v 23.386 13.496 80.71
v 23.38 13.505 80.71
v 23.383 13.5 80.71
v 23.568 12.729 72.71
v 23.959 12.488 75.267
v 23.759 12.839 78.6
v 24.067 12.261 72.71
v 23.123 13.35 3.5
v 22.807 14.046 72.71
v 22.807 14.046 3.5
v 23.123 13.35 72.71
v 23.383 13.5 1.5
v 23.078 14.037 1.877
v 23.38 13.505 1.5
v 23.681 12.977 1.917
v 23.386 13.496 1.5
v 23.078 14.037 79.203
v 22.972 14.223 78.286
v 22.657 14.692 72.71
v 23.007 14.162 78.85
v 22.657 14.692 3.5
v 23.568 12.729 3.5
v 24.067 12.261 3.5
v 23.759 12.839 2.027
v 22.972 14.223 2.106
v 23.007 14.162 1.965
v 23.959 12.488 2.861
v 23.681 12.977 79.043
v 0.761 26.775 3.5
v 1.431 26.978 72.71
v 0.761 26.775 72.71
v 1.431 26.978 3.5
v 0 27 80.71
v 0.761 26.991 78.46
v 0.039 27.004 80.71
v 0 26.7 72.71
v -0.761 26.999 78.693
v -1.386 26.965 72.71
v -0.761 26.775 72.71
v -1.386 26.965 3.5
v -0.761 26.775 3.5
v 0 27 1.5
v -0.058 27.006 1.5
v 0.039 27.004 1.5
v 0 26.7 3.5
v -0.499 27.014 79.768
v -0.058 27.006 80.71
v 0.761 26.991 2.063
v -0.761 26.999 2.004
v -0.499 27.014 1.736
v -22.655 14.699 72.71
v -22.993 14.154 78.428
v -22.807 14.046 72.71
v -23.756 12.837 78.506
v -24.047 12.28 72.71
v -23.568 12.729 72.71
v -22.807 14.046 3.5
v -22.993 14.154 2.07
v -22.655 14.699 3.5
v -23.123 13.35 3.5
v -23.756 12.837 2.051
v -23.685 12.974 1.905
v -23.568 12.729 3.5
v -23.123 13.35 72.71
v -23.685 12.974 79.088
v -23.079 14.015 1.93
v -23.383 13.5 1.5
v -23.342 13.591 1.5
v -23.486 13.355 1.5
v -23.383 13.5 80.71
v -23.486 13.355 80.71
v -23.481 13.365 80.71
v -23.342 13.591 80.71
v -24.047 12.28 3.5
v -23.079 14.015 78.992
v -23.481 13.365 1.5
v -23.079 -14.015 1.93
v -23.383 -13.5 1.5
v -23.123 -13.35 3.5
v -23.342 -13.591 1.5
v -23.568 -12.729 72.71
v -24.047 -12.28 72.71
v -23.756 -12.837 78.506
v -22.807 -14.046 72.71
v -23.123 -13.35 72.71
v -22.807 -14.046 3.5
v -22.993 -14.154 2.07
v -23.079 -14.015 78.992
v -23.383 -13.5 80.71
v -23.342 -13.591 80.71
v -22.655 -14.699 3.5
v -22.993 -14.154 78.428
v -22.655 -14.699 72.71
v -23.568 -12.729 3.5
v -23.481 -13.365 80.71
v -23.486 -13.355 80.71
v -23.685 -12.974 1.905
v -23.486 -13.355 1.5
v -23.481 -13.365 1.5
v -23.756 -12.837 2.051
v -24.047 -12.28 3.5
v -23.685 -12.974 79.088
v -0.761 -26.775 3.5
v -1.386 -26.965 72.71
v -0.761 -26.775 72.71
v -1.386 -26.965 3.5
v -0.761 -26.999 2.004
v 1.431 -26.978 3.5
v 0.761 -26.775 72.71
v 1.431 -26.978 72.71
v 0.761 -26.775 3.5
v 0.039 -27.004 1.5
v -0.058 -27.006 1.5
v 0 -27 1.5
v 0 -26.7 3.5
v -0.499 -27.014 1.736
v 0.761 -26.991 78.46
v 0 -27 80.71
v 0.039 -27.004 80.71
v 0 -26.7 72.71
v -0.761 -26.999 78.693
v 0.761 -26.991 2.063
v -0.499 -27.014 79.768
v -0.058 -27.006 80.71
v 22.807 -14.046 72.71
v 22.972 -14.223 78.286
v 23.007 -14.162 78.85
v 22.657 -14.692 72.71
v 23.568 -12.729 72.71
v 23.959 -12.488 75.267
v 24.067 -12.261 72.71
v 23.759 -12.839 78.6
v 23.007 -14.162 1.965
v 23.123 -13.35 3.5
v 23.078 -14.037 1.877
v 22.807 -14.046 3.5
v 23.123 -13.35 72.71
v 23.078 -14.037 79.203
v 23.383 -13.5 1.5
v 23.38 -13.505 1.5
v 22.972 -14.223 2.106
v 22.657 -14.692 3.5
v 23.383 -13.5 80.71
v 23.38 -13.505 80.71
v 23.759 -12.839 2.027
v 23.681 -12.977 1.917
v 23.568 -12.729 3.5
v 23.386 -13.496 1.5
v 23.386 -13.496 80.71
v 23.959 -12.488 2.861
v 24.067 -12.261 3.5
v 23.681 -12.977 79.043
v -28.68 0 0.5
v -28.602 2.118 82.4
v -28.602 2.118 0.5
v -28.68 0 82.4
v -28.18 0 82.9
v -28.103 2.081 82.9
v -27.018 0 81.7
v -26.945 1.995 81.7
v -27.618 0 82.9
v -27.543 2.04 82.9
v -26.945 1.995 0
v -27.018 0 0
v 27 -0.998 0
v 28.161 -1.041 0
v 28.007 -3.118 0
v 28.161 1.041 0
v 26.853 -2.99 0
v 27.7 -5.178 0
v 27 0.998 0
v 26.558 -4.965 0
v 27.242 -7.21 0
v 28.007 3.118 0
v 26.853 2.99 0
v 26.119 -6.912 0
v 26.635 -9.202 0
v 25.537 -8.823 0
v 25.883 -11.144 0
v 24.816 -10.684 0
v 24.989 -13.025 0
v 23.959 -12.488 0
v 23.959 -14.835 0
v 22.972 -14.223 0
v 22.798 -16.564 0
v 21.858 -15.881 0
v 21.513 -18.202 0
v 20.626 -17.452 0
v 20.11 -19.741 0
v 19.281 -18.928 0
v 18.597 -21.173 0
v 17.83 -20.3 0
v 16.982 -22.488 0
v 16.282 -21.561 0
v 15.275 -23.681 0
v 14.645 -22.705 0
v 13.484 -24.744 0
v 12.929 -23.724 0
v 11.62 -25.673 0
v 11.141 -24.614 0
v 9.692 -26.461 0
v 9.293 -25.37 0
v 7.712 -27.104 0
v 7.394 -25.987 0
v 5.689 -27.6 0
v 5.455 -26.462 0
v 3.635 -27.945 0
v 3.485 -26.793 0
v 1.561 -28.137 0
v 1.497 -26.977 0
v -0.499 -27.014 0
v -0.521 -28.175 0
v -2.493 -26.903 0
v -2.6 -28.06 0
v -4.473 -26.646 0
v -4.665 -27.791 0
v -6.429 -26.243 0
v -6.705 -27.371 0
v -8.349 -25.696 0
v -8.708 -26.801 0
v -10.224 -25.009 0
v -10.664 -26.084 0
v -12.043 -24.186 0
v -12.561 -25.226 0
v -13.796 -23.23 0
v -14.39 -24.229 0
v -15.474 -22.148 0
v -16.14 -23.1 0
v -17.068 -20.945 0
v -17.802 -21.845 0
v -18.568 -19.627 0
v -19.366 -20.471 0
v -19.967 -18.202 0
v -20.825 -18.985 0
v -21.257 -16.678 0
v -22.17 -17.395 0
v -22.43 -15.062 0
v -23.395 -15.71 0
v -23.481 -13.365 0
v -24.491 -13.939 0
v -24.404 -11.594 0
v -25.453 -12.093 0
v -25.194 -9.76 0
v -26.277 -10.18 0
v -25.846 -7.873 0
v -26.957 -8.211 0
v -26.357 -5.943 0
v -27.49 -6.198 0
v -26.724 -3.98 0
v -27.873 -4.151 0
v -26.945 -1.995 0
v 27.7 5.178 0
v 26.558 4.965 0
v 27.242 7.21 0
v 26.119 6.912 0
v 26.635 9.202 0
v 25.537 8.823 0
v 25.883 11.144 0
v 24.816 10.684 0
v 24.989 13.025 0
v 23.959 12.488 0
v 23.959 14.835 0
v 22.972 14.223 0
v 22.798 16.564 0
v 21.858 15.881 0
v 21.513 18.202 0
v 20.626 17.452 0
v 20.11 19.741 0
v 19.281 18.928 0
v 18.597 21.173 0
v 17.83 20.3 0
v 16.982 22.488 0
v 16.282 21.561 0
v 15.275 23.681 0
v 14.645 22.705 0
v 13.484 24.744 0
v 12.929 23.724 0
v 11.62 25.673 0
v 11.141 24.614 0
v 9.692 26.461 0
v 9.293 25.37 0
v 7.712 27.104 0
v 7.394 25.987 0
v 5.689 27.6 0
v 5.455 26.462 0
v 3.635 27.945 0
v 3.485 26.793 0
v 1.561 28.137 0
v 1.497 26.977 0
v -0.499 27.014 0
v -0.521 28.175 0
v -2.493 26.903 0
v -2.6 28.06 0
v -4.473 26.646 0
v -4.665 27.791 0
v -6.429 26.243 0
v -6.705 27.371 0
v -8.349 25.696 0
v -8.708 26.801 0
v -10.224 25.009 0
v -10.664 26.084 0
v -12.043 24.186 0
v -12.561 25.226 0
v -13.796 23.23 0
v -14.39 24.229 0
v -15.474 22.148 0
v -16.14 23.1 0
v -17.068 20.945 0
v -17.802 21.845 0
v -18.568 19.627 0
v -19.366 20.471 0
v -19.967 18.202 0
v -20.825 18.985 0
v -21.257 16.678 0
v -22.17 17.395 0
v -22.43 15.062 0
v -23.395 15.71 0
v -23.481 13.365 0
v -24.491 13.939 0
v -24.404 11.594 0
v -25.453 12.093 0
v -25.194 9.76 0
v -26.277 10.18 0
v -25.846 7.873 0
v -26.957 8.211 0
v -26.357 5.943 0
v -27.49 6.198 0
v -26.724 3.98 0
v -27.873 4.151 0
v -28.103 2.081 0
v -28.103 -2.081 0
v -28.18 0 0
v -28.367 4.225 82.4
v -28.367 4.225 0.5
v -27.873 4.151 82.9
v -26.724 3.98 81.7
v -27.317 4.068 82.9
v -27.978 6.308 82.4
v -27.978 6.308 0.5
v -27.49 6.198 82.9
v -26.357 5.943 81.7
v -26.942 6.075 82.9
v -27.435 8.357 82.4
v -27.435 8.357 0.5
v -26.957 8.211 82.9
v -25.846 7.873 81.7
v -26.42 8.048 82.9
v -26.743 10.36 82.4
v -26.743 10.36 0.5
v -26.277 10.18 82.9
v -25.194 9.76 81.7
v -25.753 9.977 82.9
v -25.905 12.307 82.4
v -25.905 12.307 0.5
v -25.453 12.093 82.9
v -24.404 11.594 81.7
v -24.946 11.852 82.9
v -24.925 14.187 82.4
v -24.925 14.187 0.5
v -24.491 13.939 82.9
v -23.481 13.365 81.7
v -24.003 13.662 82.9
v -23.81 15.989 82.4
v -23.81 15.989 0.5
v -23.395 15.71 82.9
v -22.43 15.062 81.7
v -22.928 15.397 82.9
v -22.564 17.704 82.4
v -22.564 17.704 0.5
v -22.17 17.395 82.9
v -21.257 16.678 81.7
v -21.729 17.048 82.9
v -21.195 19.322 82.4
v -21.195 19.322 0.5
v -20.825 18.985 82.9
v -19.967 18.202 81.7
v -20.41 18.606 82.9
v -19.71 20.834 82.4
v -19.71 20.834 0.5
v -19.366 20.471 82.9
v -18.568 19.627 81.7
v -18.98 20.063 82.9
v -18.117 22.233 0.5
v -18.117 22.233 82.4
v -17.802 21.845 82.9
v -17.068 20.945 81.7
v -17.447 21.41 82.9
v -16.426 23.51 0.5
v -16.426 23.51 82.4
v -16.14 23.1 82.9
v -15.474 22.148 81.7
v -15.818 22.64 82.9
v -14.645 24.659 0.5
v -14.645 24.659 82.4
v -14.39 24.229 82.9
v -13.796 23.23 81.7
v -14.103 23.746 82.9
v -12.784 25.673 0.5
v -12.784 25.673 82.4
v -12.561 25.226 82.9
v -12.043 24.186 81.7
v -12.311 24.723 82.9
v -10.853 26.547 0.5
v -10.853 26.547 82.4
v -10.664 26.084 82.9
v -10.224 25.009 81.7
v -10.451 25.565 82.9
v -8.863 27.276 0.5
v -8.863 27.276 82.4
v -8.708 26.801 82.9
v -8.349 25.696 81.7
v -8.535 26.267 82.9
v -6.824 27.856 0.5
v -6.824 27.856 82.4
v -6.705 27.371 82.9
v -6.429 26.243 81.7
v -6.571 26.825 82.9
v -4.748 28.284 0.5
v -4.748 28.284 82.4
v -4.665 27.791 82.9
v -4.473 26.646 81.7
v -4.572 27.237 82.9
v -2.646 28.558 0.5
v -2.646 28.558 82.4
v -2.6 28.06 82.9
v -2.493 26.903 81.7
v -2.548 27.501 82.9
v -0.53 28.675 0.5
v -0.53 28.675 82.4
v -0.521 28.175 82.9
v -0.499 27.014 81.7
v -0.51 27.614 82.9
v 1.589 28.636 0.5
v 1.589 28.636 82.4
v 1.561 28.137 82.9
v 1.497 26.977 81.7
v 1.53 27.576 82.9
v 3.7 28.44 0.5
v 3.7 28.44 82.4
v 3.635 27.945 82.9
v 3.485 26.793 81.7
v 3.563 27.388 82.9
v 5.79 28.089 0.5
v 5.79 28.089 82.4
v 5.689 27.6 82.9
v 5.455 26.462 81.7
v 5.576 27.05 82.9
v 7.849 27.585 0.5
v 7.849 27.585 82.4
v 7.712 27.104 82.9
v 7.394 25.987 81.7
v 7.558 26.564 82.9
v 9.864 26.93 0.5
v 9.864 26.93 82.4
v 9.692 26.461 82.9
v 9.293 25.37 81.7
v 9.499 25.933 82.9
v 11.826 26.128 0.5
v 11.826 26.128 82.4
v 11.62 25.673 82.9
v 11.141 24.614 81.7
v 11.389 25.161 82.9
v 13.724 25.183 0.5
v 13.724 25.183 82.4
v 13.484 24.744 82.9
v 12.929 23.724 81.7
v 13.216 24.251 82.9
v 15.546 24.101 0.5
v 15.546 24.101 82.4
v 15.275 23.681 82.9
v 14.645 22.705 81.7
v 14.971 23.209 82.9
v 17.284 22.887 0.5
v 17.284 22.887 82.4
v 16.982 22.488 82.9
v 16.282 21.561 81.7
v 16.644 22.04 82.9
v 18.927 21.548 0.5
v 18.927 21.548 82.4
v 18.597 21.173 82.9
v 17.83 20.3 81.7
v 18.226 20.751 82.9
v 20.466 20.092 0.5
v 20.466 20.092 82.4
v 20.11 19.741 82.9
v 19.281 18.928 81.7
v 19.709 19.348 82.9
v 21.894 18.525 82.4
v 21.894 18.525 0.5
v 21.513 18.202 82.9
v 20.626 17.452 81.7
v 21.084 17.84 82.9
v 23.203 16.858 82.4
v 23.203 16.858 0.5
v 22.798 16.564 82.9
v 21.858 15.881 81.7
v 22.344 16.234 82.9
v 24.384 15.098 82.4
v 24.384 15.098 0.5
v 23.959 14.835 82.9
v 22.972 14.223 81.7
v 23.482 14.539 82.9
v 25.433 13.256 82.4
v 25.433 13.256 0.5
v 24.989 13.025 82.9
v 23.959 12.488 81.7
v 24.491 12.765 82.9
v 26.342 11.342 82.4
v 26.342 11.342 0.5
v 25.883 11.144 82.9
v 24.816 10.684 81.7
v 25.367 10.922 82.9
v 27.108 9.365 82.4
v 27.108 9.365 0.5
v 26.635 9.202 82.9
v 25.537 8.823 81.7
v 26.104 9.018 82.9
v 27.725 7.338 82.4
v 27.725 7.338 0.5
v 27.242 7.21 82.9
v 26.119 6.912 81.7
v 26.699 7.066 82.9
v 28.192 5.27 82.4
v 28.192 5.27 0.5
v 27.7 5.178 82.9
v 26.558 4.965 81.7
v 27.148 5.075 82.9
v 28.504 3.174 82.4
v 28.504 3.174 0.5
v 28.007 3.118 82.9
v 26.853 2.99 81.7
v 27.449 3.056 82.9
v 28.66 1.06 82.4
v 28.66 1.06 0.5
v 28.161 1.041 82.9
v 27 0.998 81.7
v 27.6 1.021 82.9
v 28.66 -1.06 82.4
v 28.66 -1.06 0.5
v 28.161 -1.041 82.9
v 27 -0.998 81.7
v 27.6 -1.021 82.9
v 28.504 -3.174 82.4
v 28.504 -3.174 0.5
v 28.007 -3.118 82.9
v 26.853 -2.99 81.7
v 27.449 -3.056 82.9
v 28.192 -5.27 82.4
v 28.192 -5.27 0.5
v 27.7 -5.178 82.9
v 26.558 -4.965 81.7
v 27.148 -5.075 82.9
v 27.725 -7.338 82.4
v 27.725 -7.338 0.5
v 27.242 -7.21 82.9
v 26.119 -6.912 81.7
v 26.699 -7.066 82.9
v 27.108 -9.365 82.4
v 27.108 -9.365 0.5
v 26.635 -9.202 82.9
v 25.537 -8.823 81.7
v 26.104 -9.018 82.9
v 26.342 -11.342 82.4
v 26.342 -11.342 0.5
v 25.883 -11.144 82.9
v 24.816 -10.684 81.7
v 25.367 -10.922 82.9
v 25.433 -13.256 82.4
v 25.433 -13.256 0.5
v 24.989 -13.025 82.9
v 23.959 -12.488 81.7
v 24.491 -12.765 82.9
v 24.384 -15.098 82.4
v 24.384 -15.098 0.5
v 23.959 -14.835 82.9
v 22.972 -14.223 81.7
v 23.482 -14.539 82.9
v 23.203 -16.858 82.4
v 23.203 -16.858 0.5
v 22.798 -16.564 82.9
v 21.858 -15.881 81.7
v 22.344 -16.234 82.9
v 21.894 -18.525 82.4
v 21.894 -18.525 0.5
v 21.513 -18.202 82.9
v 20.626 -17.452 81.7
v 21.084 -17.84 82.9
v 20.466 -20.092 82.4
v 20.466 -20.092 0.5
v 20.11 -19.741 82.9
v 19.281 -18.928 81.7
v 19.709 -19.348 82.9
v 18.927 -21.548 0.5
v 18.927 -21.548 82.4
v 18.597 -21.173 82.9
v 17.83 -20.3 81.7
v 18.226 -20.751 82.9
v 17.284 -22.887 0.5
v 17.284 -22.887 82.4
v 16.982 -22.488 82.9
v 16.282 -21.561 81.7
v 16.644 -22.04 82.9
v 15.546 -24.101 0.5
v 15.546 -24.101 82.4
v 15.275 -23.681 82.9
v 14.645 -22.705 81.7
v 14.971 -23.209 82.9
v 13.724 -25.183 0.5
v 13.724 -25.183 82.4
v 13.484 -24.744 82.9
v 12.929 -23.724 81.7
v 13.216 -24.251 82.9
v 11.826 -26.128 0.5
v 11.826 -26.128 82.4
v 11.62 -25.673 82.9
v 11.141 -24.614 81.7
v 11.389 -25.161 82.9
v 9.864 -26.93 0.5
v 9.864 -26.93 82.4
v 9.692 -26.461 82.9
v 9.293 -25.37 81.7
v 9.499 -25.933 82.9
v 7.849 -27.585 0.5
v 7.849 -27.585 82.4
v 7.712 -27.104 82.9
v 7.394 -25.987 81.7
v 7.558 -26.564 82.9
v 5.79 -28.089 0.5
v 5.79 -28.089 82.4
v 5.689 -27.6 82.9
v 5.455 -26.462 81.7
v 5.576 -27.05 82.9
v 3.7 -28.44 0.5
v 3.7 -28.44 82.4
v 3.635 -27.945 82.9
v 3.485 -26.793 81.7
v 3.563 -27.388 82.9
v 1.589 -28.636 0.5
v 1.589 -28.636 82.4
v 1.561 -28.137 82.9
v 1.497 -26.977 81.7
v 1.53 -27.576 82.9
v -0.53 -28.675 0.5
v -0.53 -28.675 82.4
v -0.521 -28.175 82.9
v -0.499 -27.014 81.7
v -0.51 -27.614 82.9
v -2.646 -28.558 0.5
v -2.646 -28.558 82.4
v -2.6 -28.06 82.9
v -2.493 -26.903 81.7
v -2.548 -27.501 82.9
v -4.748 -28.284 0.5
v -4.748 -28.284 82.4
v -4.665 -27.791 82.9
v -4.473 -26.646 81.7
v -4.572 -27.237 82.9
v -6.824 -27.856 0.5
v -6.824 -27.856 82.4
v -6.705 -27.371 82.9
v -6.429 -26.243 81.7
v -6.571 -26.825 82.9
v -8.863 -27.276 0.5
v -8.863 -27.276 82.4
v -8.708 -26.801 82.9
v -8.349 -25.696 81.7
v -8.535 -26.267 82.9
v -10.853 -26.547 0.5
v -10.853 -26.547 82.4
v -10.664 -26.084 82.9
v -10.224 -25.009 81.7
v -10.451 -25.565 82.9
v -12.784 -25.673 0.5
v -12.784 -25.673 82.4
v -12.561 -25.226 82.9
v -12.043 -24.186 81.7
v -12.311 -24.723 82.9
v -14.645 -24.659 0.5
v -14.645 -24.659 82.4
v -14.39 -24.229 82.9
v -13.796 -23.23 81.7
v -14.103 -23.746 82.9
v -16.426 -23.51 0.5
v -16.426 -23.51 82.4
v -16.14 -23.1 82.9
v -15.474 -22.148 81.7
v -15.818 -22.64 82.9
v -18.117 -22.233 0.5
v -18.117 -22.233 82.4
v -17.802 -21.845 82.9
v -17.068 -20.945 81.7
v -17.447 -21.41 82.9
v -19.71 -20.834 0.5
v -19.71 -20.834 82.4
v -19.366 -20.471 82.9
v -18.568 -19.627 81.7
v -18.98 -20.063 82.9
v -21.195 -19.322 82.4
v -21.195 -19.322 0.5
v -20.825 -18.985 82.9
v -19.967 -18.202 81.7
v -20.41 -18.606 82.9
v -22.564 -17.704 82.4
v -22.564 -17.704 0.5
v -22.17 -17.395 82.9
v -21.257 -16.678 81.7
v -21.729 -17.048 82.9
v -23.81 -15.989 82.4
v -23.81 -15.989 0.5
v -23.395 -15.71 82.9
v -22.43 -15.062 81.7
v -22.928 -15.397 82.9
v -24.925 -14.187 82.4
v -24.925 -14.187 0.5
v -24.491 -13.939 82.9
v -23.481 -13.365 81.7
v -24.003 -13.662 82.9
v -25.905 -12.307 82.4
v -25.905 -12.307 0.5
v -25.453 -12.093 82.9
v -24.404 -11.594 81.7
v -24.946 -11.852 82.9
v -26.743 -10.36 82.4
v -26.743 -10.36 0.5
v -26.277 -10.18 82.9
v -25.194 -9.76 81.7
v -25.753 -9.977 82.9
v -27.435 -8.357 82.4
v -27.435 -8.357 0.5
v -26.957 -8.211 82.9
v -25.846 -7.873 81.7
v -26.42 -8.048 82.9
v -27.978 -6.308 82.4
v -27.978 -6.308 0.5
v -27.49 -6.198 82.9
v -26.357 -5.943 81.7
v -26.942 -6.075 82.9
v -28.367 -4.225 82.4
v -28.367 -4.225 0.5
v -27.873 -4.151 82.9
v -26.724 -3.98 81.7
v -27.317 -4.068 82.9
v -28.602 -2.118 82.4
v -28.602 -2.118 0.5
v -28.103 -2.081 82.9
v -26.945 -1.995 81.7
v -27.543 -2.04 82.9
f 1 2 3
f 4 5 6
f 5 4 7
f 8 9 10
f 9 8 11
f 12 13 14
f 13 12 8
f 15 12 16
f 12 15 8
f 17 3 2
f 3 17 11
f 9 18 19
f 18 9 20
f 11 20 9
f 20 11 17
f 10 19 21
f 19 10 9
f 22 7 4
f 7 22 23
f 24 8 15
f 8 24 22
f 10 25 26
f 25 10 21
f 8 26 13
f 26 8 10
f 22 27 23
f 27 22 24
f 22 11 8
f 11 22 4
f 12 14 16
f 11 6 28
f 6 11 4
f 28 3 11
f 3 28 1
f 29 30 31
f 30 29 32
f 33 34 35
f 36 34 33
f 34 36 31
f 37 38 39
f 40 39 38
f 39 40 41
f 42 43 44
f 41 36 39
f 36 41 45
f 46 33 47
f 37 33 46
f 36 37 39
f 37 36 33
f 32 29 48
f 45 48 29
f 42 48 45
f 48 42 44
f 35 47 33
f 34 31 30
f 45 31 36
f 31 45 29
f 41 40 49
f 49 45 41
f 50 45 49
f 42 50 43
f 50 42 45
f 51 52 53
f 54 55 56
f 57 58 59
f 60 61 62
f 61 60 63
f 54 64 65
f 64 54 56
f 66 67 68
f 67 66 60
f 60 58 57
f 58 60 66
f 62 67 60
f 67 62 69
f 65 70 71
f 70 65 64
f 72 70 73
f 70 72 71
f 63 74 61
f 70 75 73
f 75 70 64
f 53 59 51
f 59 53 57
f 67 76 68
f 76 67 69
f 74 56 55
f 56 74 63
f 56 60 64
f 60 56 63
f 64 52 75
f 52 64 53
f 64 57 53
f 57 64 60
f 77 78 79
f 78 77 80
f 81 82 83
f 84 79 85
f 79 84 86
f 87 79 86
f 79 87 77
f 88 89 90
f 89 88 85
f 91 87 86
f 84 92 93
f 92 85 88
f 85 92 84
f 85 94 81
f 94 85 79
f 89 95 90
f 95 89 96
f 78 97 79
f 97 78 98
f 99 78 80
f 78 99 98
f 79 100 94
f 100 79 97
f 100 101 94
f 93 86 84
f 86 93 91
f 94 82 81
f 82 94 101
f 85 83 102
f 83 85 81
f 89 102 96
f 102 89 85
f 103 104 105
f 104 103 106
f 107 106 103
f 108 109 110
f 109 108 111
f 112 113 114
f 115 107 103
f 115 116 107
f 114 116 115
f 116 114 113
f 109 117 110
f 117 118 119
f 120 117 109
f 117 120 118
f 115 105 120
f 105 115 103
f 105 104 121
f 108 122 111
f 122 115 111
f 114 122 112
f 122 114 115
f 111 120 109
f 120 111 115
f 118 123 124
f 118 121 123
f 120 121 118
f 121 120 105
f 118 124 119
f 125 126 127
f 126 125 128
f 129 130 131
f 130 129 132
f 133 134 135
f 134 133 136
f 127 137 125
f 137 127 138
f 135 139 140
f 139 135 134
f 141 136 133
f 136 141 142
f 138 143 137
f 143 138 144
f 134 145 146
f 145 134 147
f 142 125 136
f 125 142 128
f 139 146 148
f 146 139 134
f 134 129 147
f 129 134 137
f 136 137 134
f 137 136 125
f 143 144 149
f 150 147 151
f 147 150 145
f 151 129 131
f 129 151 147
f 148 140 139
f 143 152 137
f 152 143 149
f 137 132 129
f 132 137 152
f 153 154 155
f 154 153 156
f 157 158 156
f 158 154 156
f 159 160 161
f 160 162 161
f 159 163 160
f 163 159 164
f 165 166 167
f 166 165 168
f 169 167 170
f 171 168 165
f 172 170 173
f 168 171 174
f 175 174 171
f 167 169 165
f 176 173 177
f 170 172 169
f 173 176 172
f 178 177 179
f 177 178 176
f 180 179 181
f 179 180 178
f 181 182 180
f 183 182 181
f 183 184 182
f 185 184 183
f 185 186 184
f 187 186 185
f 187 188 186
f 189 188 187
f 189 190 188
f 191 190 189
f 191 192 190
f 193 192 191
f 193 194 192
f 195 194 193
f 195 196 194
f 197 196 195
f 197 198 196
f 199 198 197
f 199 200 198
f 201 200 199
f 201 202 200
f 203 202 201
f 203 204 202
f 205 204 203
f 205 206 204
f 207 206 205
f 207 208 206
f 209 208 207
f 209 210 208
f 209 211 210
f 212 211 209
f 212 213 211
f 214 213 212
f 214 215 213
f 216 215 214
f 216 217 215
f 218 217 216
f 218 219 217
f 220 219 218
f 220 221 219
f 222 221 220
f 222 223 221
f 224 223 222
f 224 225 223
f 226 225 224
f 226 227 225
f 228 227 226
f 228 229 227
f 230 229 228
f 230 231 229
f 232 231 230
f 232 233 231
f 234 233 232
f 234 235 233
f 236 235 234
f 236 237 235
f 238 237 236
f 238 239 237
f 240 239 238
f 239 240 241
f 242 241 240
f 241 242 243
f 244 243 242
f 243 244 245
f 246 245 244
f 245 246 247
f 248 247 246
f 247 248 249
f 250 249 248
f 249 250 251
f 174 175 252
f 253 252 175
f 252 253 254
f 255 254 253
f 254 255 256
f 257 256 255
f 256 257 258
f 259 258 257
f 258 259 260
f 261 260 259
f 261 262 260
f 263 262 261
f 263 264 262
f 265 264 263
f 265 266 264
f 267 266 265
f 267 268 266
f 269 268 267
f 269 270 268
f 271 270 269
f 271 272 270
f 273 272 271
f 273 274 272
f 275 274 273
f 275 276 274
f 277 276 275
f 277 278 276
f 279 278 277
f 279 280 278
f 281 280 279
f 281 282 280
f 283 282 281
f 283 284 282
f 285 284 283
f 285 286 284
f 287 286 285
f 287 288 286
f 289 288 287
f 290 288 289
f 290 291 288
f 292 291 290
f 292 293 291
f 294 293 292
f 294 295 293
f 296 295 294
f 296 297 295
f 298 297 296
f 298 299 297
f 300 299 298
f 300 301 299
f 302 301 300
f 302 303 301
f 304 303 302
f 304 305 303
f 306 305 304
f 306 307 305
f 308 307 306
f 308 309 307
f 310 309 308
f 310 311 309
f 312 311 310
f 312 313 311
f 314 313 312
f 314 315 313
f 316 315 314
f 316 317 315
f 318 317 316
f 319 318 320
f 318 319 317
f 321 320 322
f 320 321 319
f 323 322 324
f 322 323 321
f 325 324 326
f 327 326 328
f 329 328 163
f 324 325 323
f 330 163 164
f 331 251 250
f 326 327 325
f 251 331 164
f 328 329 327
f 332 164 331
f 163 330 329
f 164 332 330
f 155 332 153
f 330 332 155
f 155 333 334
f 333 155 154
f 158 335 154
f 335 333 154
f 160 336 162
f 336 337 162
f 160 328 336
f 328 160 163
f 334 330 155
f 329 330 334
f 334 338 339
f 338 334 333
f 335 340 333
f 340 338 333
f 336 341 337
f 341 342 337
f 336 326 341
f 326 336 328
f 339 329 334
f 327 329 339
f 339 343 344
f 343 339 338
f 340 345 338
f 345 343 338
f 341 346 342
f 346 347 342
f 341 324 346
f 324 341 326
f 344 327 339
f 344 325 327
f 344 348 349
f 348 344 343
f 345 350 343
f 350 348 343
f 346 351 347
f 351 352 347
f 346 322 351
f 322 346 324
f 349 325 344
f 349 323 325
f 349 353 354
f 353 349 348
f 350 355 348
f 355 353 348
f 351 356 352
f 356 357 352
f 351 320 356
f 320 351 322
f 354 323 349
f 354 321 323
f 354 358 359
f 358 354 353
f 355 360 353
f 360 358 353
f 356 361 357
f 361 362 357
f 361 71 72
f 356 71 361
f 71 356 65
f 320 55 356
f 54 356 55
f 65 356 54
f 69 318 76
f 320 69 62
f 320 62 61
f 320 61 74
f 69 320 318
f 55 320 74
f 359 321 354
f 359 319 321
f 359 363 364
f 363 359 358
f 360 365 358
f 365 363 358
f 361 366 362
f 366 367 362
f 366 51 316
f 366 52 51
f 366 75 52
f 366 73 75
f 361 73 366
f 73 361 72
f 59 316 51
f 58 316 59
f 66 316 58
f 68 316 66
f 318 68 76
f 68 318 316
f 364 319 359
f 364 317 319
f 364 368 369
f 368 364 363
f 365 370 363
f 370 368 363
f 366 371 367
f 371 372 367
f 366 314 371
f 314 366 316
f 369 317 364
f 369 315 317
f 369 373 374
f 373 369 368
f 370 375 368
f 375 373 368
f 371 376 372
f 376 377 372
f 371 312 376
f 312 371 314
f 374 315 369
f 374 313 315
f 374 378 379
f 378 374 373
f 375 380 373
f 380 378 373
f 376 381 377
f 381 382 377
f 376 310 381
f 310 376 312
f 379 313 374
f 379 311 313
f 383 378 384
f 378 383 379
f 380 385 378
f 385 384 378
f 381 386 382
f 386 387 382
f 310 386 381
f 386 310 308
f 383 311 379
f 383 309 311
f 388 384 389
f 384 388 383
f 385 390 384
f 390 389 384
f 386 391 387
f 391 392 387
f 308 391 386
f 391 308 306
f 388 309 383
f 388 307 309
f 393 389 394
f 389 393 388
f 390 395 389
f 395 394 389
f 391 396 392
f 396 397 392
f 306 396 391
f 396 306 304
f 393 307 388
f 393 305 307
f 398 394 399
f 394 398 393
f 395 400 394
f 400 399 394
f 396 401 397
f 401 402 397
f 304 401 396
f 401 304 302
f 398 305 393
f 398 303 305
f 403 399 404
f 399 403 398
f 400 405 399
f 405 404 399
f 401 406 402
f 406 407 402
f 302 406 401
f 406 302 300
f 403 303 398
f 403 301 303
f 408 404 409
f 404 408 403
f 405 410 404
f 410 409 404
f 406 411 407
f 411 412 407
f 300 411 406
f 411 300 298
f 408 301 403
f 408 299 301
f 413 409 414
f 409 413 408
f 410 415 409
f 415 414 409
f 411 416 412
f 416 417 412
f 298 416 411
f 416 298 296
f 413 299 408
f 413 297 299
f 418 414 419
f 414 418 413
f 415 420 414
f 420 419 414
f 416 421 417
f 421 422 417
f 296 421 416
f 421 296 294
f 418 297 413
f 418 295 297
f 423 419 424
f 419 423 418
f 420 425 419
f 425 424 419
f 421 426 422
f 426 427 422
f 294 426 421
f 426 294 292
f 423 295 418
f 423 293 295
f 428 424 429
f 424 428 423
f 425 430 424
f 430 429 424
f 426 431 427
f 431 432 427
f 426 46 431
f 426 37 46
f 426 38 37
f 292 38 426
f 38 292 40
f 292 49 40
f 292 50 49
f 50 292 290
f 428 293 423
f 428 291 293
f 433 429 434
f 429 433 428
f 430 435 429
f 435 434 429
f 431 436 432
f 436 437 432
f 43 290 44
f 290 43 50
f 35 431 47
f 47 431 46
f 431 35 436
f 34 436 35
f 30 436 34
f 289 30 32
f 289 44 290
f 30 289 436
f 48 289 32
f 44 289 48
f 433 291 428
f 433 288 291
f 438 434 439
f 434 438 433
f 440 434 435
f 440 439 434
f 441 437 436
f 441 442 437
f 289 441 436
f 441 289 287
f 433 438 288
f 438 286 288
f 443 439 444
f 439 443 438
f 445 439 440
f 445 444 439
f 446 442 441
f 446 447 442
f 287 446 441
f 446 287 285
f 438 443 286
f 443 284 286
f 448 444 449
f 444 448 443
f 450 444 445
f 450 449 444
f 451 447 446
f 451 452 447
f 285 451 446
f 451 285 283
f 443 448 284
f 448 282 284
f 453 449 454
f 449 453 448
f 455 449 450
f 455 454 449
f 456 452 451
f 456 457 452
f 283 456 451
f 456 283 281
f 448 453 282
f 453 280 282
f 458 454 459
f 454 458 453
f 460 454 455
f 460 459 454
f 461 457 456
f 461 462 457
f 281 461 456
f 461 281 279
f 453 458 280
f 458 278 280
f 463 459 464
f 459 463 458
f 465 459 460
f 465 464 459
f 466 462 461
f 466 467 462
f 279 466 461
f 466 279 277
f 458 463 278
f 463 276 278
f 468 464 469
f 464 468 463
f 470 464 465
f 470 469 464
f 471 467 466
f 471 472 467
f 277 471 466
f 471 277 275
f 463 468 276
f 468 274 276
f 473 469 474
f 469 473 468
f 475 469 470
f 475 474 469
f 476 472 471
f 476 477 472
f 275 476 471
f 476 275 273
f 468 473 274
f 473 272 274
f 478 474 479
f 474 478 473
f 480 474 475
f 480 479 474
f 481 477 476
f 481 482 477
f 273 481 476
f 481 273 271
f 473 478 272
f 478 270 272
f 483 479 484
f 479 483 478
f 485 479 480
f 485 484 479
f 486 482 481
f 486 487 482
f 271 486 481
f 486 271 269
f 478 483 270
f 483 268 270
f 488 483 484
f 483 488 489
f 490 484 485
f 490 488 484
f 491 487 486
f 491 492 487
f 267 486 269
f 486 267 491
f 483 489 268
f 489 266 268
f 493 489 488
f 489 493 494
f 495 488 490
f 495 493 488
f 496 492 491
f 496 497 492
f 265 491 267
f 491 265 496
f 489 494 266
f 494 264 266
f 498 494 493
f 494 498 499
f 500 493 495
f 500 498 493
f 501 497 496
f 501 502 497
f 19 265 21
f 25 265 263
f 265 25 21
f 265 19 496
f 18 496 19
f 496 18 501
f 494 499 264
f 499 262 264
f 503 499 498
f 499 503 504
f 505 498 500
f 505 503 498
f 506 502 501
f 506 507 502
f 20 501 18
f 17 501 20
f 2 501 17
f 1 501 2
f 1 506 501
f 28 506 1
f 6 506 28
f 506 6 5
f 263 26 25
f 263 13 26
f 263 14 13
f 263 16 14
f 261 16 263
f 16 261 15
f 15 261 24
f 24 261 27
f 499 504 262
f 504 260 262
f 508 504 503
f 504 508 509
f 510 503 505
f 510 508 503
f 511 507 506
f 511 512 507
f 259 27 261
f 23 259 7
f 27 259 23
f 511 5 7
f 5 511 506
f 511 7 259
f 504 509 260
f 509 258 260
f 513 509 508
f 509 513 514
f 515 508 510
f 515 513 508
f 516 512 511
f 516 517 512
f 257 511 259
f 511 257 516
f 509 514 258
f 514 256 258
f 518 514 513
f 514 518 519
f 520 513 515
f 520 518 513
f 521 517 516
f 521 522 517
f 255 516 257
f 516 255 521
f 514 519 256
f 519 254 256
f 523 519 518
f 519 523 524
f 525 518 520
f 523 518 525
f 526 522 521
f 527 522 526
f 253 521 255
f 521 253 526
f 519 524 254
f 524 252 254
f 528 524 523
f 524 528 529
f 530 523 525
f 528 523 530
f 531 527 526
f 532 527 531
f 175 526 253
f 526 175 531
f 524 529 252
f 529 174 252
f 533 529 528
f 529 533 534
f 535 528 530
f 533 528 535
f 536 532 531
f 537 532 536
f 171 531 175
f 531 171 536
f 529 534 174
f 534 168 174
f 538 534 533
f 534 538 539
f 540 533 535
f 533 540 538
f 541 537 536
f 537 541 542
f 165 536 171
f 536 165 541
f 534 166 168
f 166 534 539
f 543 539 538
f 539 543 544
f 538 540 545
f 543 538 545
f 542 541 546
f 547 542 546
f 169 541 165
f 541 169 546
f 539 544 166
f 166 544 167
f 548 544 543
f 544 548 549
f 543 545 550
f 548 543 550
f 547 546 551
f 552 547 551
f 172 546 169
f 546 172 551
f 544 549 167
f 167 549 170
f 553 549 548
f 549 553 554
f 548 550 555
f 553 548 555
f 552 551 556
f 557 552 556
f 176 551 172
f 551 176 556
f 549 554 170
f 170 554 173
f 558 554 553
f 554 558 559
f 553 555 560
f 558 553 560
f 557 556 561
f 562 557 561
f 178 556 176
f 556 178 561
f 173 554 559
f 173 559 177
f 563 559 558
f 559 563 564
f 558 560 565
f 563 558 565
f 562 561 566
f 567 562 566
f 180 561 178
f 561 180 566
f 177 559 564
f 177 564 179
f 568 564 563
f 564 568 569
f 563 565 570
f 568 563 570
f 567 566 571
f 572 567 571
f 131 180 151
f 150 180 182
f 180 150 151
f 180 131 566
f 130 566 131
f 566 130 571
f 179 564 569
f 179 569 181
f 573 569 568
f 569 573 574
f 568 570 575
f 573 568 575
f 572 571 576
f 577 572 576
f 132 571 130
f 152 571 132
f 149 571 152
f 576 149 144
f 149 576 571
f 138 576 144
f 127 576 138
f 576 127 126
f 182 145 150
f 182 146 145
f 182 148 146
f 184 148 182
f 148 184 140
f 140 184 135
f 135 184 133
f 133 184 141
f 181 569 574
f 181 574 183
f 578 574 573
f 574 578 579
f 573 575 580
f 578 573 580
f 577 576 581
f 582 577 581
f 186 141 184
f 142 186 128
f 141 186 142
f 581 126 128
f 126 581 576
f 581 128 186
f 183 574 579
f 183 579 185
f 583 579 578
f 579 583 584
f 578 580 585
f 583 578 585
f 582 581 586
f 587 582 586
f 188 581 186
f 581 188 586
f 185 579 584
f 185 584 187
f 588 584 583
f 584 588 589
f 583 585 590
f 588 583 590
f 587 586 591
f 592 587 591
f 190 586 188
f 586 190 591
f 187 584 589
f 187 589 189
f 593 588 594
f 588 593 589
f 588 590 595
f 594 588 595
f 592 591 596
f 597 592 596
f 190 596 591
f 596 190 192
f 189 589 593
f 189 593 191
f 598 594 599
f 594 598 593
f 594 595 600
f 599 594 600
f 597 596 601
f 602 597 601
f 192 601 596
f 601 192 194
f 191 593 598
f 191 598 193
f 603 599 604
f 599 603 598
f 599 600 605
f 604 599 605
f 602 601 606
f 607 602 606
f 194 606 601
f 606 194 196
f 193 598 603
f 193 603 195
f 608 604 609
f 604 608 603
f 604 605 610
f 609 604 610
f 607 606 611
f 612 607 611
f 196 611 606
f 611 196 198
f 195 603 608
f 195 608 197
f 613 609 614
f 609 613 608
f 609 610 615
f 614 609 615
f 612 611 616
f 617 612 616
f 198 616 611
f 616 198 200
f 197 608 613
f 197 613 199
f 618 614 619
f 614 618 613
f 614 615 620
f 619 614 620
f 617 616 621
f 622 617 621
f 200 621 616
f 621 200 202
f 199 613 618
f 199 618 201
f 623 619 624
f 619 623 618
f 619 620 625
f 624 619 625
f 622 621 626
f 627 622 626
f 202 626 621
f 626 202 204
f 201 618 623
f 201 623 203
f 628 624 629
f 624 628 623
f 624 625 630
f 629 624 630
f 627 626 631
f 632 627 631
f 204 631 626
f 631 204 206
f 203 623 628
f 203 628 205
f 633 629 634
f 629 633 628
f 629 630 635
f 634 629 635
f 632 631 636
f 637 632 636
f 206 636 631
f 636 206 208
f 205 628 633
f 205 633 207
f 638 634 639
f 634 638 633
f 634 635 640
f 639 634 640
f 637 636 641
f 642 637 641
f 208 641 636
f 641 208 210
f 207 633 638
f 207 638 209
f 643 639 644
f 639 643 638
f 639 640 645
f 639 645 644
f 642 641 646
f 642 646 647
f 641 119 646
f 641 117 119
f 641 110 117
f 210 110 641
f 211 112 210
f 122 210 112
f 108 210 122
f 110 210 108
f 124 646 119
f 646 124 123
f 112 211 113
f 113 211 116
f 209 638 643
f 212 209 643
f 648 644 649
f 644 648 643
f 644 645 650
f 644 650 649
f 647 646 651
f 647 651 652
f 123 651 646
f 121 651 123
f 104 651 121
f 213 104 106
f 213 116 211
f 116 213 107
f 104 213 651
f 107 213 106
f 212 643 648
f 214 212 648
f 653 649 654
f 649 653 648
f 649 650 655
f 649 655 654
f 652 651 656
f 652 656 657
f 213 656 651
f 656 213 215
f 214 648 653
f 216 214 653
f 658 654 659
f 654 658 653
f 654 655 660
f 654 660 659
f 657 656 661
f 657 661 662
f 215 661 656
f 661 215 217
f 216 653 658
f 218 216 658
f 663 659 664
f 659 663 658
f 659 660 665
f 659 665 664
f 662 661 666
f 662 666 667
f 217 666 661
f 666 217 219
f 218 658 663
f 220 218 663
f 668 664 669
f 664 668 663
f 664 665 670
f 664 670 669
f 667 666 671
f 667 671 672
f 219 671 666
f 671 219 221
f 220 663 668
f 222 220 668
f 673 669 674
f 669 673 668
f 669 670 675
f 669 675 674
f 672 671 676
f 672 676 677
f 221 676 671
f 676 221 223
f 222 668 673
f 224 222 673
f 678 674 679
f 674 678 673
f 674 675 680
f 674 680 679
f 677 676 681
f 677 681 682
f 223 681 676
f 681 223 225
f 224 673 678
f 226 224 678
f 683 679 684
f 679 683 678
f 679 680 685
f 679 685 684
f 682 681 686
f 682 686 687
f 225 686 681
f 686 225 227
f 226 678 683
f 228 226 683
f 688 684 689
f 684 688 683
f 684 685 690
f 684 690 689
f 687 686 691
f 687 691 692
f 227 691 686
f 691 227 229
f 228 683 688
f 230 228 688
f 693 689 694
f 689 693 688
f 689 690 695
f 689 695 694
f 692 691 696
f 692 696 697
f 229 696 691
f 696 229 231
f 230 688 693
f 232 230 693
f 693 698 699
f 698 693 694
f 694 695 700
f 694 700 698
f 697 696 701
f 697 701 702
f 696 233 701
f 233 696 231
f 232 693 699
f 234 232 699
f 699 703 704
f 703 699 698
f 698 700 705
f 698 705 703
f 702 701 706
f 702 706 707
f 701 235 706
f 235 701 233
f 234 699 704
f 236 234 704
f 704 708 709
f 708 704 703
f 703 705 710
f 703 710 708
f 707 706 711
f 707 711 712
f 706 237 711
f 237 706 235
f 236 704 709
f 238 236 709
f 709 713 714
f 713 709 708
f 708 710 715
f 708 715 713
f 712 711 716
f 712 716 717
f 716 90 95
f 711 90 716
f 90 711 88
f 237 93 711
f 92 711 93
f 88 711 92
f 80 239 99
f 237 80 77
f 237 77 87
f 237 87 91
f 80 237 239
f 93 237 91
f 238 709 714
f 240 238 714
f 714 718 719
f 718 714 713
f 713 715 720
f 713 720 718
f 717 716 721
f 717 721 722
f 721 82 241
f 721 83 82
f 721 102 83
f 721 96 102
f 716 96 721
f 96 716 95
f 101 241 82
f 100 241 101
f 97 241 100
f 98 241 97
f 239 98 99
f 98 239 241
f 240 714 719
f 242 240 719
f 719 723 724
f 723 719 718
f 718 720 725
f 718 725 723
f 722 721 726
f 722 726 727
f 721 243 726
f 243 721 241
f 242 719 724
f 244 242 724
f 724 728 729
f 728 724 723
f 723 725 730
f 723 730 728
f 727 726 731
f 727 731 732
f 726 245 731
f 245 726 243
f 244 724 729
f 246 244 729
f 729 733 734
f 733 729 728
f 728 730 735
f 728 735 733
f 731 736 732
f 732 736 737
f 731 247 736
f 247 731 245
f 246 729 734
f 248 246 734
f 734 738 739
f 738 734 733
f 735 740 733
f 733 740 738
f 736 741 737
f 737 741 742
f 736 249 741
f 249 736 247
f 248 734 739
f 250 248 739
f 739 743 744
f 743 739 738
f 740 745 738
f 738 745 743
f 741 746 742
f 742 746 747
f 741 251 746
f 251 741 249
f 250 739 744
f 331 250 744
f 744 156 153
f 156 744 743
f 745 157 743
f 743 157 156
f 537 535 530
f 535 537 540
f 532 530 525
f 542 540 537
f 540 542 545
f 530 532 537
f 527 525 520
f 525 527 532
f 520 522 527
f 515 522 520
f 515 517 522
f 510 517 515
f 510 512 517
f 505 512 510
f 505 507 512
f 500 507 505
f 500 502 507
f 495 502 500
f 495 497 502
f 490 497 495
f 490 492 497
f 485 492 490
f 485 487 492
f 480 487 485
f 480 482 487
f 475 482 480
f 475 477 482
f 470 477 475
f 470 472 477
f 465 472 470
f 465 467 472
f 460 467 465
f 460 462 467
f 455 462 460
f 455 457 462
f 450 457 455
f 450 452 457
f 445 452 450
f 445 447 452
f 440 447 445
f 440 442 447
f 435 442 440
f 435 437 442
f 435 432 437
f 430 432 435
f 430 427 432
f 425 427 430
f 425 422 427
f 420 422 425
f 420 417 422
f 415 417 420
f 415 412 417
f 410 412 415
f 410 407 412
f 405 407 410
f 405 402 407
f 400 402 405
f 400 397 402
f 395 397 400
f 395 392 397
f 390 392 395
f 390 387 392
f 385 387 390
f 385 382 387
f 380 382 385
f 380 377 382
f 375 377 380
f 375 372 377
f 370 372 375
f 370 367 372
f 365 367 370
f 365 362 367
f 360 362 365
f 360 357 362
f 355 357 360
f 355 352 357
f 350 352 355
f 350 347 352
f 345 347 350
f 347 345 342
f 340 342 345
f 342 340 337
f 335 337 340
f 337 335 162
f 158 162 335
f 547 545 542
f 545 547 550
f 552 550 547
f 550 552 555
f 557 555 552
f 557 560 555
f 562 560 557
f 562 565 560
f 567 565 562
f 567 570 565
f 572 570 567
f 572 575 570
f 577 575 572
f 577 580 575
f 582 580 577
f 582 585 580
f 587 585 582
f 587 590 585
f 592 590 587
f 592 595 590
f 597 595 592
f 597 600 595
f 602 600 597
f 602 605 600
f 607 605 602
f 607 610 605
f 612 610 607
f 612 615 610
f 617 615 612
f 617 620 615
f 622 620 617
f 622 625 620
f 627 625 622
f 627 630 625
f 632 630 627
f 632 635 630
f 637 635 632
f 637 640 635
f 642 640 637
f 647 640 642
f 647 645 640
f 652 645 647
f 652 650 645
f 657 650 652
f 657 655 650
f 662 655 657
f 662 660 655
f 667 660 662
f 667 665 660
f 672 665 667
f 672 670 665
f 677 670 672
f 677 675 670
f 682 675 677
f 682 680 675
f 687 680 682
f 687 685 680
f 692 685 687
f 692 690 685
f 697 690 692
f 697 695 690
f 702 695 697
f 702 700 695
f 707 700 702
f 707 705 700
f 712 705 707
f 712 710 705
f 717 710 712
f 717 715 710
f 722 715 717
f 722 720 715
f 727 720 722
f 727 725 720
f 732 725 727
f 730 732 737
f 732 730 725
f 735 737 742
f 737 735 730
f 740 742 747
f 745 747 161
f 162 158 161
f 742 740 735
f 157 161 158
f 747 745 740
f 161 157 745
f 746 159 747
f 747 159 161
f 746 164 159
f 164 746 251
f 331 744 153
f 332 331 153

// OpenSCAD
// Sleeve — drops into the fish koozie and holds a 250 ml / 8.3 oz slim can
// instead of the 12 oz one.
//
// The fish-koozie cousin of slim-can-adapter-ring-12oz-to-8-3oz.scad, and
// the same sleeve: Ø54.00 bore with six grip ribs for the 250 ml can, a 1.68
// wall, Ø57.36 outside, which goes into the fish's Ø58.40 bore past its six
// ribs exactly as a 12 oz can does. The fish's bore is the holders' bore to
// the last digit — same recipe, same ribs, same 0.23 of pull-in assumed — so
// every number in [Can], [Host] and [Grip ribs] is lifted from that ring and
// none of them is a decision made here.
//
// WHAT IS DIFFERENT IS THE TOP, AND THERE ISN'T ONE. The holders have a flat
// Ø76.20 rim for a lip to sit on and be lifted by. The fish has a mouth. Its
// Ø58.40 bore is cut straight up through both jaws to the tips of the lips,
// so above the bore's top (z 86.0 on the fish, lead-in to 86.6) there is no
// rim, no ledge and no room: the mouth is the bore, continued, with the jaws
// standing 105 to 117 mm up on two sides and the corners of the mouth down
// at 89 and 92–98 on the other two. Measured on the built mesh of
// slim-can-holder-3in-12oz-fish v02, in 30-degree sectors from +x: 97.5, 110.1, 116.9,
// 116.8, 109.9, 98.3, 89.3, 104.6, 111.9, 111.9, 105.5, 91.9. A lip cannot
// go anywhere in that.
//
// So there is no lip, and the sleeve works the other way round from the
// ring: it stands on the fish's floor instead of hanging off a rim, and it
// comes up through the bore's top and the lead-in to end 1 mm below the low
// corner of the mouth, so that nothing of it shows outside the fish (Ziad,
// 2026-09-19: the ring should not be visible outside the fish's mouth; the
// first draft stood 10 mm proud there as a handle). The bottom is open, like
// the ring's, so the can sits on the fish's own floor and the fish's drain
// still pushes it out from underneath. Nothing sets the depth but the
// floor, which is flat and on the axis; a lip seated on the fish's skewed
// lead-in would have sat crooked.
//
// ⚠️ WITH THE RIM HIDDEN THERE IS NOTHING TO PULL THE SLEEVE OUT BY. The
// fish's ribs hold it at 0.21 on diameter, snug, and the rim is a 1.68 mm
// edge flush inside a Ø58.4 channel. The can comes out through the drain
// as before; the sleeve does not, short of a fingernail on its rim. If that
// matters, the fix is a floor: a closed bottom with its own small drain
// turns the fish's Ø12 drain into an ejector for the sleeve, and gives the
// print a disc to stand on instead of a ring. Not done, not asked for.
//
// THE WALL IS ONE RUNG, for the ring's reason: between a Ø54.00 bore and an
// outside that has to pass the fish's ribs there is 1.68 of wall and no more.
// The slicing reference's four-loop figure is 1.74; 1.68 is what the ring is
// drawn at and the two should be printed and judged together.
//
// ORIENTATION. Drawn as used and PRINTED THE SAME WAY, open bottom on the
// bed: there is no lip to turn it over for, and printed this way up the
// first layer is the base with its 0.50 chamfer and a square inside edge,
// 1.18 wide, where the rim end would put a 0.4 mm ring on the plate. Going
// up, the rib feet grow inward at 8 degrees, the rib ramps and the base
// chamfer narrow, and the mouth lead-in at the top opens the bore outward,
// all of which the printer sees as nothing. The rim's outside chamfer
// narrows going up too. An 83 mm tube on a 1.2 mm ring is tall for its foot;
// if it lets go of the plate, a brim is the slicer's answer, not a wider
// foot that would not pass the ribs.
//
// ⚠️ THE ONE THING NOT PROVEN is how an outside diameter prints on this
// machine — the same gap the ring has, and neither has been printed yet.
// The coupon is the bottom 20 mm of the sleeve, printed exactly as the
// sleeve prints, so the base chamfer is on the bed and the cut face is at
// the top where there is no elephant foot to fake a tight reading. It tests
// the sleeve in the fish and a can in the sleeve at once.
//
// The coupon is the only thing here a plate can answer, and there is one
// variant for it, so the plate and the component are the same. Keep the
// names stable — utils/coupon.sh reads these and knows nothing about the part.
//
// COUPON-COMPONENTS: fit=coupon
// COUPON-PLATE: coupon

/* [Output] */

// "cut" is a half-section for reading the wall, the chamfers and the ribs.
// Not for printing. "coupon" is the fit test; see [Fit coupon].
/* [Assembly display] */
// default preserves the original part, coupon and print selectors.
view = "default"; // [default, together, exploded]

show = "part";   // [part, cut, coupon]

$fa = 4;   // organic faceting per the 0.4-nozzle rule; no global high $fn
$fs = 0.4;
eps = 0.01;

/* [Can] */

// Body diameter of a 250 ml / 8.3 oz slim can (mm). Red Bull's sleek can, and
// the number slim-can-holder-8-3oz.scad is cut to.
can_d = 53.0;
// Clearance on diameter at the bore itself (mm). The ribs, not this, set the
// grip — this only has to let the can pass.
can_slop = 0.40;
// Extra diameter added to the bore to cover this machine's bore shrinkage (mm).
// Settled 2026-08-22 on the 250 ml holder's fit coupon and carried here
// unchanged, as the ring carries it. ⚠️ Do NOT "correct" this to the measured
// 0.23: it and rib_h are a matched pair.
bore_comp = 0.60;

/* [Host — the fish this drops into] */

// Read off parts/slim-can-holder-3in-12oz-fish.scad and its built mesh. Change them only
// if the fish changes; nothing here is a choice.

// The fish's bore as drawn (mm): can 57.40 + slop 0.40 + comp 0.60.
host_bore_d = 58.40;
// What this machine takes out of a bore that size (mm on diameter), measured
// on the Ø54 bore and carried by the holders' own argument that the loss is
// absolute, not proportional.
host_bore_loss = 0.23;
// How far the fish's grip ribs stand into its bore (mm).
host_rib_h = 0.30;
// Top of the fish's floor (mm above its bed): floor_t. The sleeve stands on it.
host_floor_z = 5.40;
// Top of the fish's bore (mm), where the lead-in starts opening: bore_top.
host_bore_top_z = 86.03;
// The lowest point of the mouth's rim at the bore (mm above the fish's bed):
// the corner of the mouth at 180–210 degrees, measured on the built mesh.
// The sleeve's rim stands proud of this.
host_mouth_low_z = 89.3;
// Drain through the fish's floor (mm), on the axis. The sleeve's bottom ring
// has to clear it.
host_drain_d = 12.0;

/* [Sleeve] */

// Wall between the can and the fish (mm). 1.68 is 4 walls at 0.42; see THE
// WALL IS ONE RUNG in the header.
wall_w = 1.68;
// How far the rim stands above the lowest corner of the fish's mouth (mm).
// Negative puts it below, out of sight: -1 is a millimetre of margin under
// the corner, and still 2.3 above the top of the bore.
proud = -1.0;
// 45-degree chamfer on the outside of the bottom edge (mm). On the bed, so
// it is the elephant-foot chamfer — the reference's PETG minimum — and the
// lead-in past the fish's ribs on the way down.
base_cham = 0.50;
// 45-degree chamfer on the outside of the rim (mm). Narrows going up.
rim_cham = 0.50;
// Lead-in at the mouth, for the can (mm): how far out on radius, and over
// what height. Small, because the wall has 1.68 to share between this and
// the rim chamfer and the rim still has to have a top.
mouth_cham_r = 0.60;
mouth_cham_h = 1.20;

/* [Grip ribs] */

// Rounded vertical ribs in the bore. The 250 ml holder's six, unchanged.
rib_count = 6;
rib_h     = 0.30;   // how far each rib stands into the bore (mm)
rib_w     = 3.00;   // chord width of the bump (mm)
rib_ramp  = 8.0;    // lead-in at the top, over which the rib fades to nothing (mm)
rib_foot  = 2.0;    // the same at the bottom, where the printer sees it as an overhang (mm)

/* [Fit coupon] */

// Height of the coupon (mm): the bottom of the sleeve, base chamfer and rib
// feet included, printed the same way up as the sleeve. 20 is the 2 mm foot
// and 16.5 mm of full-proud rib.
coupon_h = 20.00;

/* [Quality] */

// Chord error target (mm). 0.02 is the 0.4-nozzle figure.
chord_err = 0.02;

/* [Hidden] */

// Facets for a target chord error on a given radius.
function facets(r, e = chord_err) = ceil(180 / acos(1 - e / r));
// Radius that makes the INSCRIBED polygon's inner radius equal r.
function r_hole(r, n) = r / cos(180 / n);

bore_d    = can_d + can_slop + bore_comp;
bore_r    = bore_d / 2;
sleeve_od = bore_d + 2 * wall_w;
sleeve_r  = sleeve_od / 2;

rim_z     = host_mouth_low_z + proud;      // the rim, on the fish's scale
total_h   = rim_z - host_floor_z;          // floor to rim

nseg      = facets(sleeve_r);
r_bore    = r_hole(bore_r, nseg);

// What the sleeve faces in the fish, printed, and what it leaves.
host_across_ribs = host_bore_d - host_bore_loss - 2 * host_rib_h;
host_clear       = host_across_ribs - sleeve_od;

rib_r    = rib_h > 0 ? (rib_w * rib_w / 4 + rib_h * rib_h) / (2 * rib_h) : 0;
rib_ax   = bore_r + rib_r - rib_h;
rib_z0   = base_cham + 1.0;
rib_z1   = total_h - mouth_cham_h - 1.0;

assert(sleeve_od < host_bore_d - 2 * host_rib_h,
       str("the sleeve is fatter than the fish's ribs will pass: ",
           sleeve_od, " against ", host_bore_d - 2 * host_rib_h));
assert(wall_w >= 1.26,
       "the wall is under 3 lines at 0.42: raise wall_w");
assert(bore_r + mouth_cham_r < sleeve_r - rim_cham,
       "the mouth lead-in has run into the rim's chamfer: the rim has no top");
assert(bore_d > host_drain_d + 2,
       "the sleeve's bottom ring sits over the fish's drain");
assert(rim_z > host_bore_top_z + 1,
       "the rim is down inside the fish's bore: raise proud");
assert(rib_z1 - rib_ramp > rib_z0 + rib_foot,
       "the rib ramp and foot overlap: the sleeve is too short for them");
assert(coupon_h > rib_z0 + rib_foot + 5,
       "the coupon is too short to reach full-proud rib");

// Solid section, before the bore is cut. Bottom inner corner first, running
// counter-clockwise: bottom, base chamfer, outside, rim chamfer, top, mouth
// lead-in, bore.
module sleeve_solid() {
    pts = [
        [r_bore,                 0],
        [sleeve_r - base_cham,   0],
        [sleeve_r,               base_cham],
        [sleeve_r,               total_h - rim_cham],
        [sleeve_r - rim_cham,    total_h],
        [r_bore + mouth_cham_r,  total_h],
        [r_bore,                 total_h - mouth_cham_h]
    ];
    rotate_extrude(angle = 360, $fn = nseg) polygon(pts);
}

module ribs() {
    n = facets(rib_r);
    for (i = [0 : rib_count - 1])
        // Half a pitch off the x axis, so the cut view at y = 0 shows the bore
        // and not a rib edge-on.
        rotate([0, 0, 30 + i * 360 / rib_count])
            hull() {
                translate([bore_r + rib_r, 0, rib_z0])
                    cylinder(r = rib_r, h = eps, $fn = n);
                translate([rib_ax, 0, rib_z0 + rib_foot])
                    cylinder(r = rib_r, h = eps, $fn = n);
                translate([rib_ax, 0, rib_z1 - rib_ramp])
                    cylinder(r = rib_r, h = eps, $fn = n);
                translate([bore_r + rib_r, 0, rib_z1])
                    cylinder(r = rib_r, h = eps, $fn = n);
            }
}

// Each rib is a 3.90 mm arc of which 0.30 is wanted, so left alone it would
// poke out through a 1.68 mm wall. It is clipped to a cylinder inside the
// sleeve's outer face before it goes in — inside, not at it, so no face of
// the clip is coincident with the sleeve.
module sleeve() {
    union() {
        sleeve_solid();
        if (rib_count > 0 && rib_h > 0)
            intersection() {
                ribs();
                cylinder(r = sleeve_r - 0.20, h = total_h, $fn = nseg);
            }
    }
}

// The fit coupon: the bottom coupon_h of the sleeve, as it is.
module fit_coupon() {
    intersection() {
        sleeve();
        translate([-sleeve_od, -sleeve_od, -eps])
            cube([2 * sleeve_od, 2 * sleeve_od, coupon_h + eps]);
    }
}

echo(str("sleeve: outside ", sleeve_od, "  bore ", bore_d,
         "  across ribs ", bore_d - 2 * rib_h, "  wall ", wall_w,
         "  ", total_h, " tall, floor at ", host_floor_z,
         " to rim at ", rim_z, " on the fish"));
echo(str("in the fish: faces ", host_across_ribs,
         " across its printed ribs, clearance ", host_clear,
         " on diameter; rim stands ", proud,
         " above the low corner of the mouth (negative is below it) and ",
         rim_z - host_bore_top_z, " above the bore's top"));
echo(str("on the can: printed bore ", bore_d - host_bore_loss,
         ", across ribs ", bore_d - host_bore_loss - 2 * rib_h,
         ", clearance ", bore_d - host_bore_loss - 2 * rib_h - can_d,
         " on a ", can_d, " can"));



// Assembly display changes placement only; the original output remains the default.
// Single printed piece: both display modes show the same intact part.
module feral_default_output_1a8d7f3046da() {
if (show == "coupon")
    fit_coupon();
else if (show == "cut")
    difference() {
        sleeve();
        translate([-sleeve_od, -sleeve_od, -eps])
            cube([2 * sleeve_od, sleeve_od, total_h + 1]);
    }
else if (show == "part")
    sleeve();
}

module feral_assembly_view_1a8d7f3046da(explode=false) {
feral_default_output_1a8d7f3046da();
}

assert(view == "default" || view == "together" || view == "exploded", "Unknown assembly display");
if(view == "default") feral_default_output_1a8d7f3046da();
else feral_assembly_view_1a8d7f3046da(view == "exploded");
